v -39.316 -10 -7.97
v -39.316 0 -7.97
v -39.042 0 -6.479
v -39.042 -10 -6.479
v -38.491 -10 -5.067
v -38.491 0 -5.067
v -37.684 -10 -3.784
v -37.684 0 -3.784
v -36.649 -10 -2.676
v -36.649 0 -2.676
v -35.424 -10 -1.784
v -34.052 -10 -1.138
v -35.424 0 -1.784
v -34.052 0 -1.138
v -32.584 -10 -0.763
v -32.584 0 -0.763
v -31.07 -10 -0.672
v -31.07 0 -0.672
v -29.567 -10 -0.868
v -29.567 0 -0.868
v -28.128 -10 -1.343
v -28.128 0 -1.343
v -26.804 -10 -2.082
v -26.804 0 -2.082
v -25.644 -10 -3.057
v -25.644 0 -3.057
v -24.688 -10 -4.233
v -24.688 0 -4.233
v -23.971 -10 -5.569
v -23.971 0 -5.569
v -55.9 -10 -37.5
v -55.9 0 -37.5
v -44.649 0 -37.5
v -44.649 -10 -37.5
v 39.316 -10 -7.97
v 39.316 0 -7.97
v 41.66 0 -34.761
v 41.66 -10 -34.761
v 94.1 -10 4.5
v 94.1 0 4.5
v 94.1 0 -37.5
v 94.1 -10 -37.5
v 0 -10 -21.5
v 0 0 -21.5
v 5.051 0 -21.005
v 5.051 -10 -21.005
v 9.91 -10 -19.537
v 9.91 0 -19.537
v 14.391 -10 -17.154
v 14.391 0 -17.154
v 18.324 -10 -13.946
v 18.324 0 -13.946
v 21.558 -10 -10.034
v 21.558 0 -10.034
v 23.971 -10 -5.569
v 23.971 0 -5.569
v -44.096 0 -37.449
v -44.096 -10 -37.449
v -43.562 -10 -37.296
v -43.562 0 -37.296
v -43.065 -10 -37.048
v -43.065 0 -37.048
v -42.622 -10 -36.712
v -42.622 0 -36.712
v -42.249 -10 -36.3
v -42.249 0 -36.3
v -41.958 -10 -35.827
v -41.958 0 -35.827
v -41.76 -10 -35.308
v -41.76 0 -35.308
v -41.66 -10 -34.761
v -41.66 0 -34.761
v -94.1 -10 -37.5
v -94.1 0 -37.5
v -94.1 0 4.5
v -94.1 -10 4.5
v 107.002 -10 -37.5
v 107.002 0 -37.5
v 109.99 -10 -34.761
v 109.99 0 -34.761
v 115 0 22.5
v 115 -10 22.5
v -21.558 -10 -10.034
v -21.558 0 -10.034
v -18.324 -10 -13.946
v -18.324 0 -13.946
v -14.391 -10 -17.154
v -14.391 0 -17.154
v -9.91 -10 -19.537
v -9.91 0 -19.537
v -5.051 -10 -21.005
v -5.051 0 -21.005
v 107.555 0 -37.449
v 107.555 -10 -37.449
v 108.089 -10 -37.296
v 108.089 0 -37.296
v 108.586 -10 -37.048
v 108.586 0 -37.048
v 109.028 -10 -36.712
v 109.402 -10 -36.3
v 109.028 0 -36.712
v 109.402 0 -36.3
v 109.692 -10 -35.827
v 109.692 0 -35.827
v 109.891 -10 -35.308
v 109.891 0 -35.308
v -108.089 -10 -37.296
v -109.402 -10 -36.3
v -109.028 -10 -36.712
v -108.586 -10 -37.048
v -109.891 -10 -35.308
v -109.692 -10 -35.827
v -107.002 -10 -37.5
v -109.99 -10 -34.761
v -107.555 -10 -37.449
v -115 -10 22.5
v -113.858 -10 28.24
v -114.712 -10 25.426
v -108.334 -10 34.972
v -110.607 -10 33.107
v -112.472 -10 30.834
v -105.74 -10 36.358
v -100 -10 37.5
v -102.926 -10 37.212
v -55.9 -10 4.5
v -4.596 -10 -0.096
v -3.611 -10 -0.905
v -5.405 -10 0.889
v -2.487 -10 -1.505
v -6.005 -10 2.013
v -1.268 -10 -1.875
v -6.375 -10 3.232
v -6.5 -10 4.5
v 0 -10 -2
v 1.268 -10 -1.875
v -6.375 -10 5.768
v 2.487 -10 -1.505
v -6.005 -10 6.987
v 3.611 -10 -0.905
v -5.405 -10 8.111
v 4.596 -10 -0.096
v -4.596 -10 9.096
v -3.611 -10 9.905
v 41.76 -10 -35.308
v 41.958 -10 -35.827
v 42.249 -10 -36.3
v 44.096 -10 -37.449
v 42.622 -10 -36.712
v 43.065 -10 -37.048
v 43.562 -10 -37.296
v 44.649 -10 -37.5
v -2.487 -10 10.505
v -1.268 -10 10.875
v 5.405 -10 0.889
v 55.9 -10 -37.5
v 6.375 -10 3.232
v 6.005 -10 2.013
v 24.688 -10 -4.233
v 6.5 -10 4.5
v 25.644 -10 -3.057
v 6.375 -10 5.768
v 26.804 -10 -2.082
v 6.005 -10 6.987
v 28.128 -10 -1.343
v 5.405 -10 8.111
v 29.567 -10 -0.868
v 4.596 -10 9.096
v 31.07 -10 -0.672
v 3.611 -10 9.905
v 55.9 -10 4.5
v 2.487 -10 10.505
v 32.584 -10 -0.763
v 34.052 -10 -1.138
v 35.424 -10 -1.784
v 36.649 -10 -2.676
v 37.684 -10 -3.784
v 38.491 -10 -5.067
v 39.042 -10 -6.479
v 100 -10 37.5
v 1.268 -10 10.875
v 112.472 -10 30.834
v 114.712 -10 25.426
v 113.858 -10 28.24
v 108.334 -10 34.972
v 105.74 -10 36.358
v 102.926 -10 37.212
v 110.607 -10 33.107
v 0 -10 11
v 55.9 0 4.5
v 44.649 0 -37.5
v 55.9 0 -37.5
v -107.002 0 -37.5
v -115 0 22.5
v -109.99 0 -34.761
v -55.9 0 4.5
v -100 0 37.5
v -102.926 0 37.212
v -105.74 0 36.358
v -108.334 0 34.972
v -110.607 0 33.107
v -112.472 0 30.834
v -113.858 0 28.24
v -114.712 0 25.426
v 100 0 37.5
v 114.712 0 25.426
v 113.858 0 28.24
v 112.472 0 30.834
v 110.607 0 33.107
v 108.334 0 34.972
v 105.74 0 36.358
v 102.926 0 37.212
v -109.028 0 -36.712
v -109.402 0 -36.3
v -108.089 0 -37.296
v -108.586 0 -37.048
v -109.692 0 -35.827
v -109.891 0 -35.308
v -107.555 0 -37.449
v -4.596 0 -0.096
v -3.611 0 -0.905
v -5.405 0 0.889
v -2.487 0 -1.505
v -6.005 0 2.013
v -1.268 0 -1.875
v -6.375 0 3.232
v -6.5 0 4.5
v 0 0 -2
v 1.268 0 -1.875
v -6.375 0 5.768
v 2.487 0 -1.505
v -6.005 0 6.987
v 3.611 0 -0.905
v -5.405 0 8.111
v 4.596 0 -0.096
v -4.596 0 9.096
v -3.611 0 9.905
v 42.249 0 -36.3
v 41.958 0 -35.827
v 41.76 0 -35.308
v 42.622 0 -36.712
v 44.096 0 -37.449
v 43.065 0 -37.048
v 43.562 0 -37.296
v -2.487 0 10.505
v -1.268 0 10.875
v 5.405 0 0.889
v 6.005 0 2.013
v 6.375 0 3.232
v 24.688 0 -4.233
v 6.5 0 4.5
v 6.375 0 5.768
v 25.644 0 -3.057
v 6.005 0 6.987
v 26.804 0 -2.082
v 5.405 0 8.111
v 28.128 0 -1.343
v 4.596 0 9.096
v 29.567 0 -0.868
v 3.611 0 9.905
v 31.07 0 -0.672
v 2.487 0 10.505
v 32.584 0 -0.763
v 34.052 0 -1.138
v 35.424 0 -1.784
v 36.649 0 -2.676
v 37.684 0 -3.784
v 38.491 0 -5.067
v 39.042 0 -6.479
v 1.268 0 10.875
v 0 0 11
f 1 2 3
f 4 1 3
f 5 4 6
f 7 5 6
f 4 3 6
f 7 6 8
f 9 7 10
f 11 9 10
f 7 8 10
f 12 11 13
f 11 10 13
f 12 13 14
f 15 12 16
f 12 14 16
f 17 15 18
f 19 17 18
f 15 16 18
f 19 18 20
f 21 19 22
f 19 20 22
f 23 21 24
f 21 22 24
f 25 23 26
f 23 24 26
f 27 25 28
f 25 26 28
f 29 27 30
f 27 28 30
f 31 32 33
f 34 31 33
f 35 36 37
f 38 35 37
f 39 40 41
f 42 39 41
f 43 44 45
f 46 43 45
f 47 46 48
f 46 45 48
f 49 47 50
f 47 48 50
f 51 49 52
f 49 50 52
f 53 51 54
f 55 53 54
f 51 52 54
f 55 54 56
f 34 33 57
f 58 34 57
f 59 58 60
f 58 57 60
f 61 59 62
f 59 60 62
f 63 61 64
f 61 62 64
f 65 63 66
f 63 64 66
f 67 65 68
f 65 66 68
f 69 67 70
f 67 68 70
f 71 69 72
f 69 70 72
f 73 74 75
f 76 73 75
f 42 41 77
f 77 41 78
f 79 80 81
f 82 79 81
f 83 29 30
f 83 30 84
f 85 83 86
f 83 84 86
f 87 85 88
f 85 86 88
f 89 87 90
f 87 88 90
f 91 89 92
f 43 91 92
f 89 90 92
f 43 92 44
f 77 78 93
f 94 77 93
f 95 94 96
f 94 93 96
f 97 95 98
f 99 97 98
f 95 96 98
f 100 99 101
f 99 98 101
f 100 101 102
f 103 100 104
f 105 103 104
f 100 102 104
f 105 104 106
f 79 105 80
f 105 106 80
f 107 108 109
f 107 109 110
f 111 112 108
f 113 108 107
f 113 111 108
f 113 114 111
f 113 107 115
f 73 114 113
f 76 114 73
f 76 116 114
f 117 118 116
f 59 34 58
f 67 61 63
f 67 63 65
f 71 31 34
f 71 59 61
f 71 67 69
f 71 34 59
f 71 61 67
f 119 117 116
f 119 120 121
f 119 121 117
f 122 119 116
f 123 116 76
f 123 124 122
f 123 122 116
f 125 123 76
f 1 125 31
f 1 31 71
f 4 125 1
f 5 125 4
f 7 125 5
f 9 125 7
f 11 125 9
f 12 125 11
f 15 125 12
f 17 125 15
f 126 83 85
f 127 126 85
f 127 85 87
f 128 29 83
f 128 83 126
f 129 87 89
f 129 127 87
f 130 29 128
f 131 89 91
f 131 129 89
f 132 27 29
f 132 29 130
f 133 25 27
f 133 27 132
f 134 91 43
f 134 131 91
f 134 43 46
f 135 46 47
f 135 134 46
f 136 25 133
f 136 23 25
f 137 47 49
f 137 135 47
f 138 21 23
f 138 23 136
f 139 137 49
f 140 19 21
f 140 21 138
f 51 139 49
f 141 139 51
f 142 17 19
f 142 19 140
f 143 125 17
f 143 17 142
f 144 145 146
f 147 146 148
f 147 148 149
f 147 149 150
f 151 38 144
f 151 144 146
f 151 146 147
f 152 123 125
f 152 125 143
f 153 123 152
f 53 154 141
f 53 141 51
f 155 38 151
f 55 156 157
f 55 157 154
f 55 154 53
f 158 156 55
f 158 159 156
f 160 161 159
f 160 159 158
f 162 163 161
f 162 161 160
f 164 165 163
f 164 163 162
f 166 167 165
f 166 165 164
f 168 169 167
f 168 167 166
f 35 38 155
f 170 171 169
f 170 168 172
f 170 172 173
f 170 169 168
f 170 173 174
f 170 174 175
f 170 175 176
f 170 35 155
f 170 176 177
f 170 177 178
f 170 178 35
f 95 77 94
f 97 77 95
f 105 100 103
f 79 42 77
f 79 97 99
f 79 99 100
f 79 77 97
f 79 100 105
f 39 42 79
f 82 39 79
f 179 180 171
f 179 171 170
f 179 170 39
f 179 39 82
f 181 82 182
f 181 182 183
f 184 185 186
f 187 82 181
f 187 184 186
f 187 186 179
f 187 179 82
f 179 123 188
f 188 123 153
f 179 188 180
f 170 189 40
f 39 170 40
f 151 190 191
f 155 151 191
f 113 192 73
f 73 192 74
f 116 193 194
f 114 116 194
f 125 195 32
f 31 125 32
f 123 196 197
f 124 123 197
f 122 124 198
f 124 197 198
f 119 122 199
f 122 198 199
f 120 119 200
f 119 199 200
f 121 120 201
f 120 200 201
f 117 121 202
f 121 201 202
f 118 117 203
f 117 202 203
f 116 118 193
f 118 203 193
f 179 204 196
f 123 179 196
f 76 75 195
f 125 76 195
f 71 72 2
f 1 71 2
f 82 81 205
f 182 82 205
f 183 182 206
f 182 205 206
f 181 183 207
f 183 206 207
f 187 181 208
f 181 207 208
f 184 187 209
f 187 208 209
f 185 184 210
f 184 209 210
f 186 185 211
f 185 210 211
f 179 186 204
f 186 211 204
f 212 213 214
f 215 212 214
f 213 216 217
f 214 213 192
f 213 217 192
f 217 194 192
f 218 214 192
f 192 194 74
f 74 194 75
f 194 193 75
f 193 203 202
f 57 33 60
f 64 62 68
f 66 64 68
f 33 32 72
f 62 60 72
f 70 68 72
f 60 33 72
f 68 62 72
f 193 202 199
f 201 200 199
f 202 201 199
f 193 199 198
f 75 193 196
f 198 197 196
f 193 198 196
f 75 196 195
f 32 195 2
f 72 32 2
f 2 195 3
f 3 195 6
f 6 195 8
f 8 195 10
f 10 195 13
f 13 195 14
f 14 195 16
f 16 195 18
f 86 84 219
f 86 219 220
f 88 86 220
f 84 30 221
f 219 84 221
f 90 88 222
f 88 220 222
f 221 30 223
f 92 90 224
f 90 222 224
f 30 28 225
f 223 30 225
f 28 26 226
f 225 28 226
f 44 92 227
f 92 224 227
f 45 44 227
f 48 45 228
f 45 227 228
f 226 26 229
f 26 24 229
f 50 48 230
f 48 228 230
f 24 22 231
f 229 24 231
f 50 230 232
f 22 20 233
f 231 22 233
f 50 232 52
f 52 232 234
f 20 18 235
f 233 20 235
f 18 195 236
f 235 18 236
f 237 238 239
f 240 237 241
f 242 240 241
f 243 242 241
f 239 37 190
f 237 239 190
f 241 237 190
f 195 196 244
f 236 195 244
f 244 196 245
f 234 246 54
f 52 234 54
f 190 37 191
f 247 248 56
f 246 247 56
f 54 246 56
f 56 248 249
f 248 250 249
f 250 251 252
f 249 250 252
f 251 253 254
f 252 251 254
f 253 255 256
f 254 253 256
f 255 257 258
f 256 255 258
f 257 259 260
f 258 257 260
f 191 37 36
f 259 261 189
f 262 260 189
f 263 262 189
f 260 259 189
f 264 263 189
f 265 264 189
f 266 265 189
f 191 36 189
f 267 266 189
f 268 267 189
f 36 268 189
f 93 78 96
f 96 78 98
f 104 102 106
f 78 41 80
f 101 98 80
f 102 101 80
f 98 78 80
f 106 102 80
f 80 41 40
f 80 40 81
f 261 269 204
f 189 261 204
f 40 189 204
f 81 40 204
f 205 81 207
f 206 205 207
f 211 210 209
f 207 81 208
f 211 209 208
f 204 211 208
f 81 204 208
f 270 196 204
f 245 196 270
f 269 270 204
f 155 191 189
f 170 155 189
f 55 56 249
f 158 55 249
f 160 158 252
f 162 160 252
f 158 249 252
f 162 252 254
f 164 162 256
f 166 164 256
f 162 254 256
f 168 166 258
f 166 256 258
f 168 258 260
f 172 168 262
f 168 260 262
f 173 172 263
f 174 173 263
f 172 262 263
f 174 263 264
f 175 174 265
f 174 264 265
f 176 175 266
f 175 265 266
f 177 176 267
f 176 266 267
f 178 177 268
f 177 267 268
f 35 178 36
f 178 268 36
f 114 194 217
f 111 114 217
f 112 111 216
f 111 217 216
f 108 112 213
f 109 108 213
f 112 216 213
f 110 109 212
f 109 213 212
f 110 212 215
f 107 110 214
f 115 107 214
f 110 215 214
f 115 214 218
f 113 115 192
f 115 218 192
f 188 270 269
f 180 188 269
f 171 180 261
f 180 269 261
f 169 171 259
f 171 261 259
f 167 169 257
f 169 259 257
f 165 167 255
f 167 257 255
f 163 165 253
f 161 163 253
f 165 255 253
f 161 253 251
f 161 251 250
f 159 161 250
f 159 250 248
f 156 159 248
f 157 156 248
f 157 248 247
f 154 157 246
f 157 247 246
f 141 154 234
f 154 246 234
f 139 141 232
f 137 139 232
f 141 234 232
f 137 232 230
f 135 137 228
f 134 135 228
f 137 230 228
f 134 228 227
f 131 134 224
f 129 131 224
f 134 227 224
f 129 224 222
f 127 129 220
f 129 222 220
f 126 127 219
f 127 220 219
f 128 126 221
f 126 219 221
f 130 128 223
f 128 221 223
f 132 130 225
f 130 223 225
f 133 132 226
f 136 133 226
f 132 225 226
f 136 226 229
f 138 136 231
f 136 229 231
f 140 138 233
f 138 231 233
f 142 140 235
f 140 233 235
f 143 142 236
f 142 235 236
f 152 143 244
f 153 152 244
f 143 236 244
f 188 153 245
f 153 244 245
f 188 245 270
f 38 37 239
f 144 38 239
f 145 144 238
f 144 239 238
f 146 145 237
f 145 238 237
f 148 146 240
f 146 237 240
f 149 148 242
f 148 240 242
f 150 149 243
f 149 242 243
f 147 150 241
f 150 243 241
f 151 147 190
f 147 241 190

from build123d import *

# Parameters (mm, degrees)
F1_DEPTH = 10


with BuildPart() as f1:
    # F0 (on Front) → F1 (new body)
    with BuildSketch(Plane.XZ):
        with BuildLine():
            Line((-55.9, -37.5), (-44.648994, -37.5))
            ThreePointArc((-44.648994, -37.5), (-42.622223, -36.711832), (-41.660409, -34.761467))
            Line((-41.660409, -34.761467), (-39.316447, -7.969854))
            ThreePointArc((-39.316447, -7.969854), (-32.58351, -0.763255), (-23.971151, -5.568959))
            ThreePointArc((-23.971151, -5.568959), (-14.391092, -17.154017), (0, -21.5))
            ThreePointArc((0, -21.5), (14.391092, -17.154017), (23.971151, -5.568959))
            ThreePointArc((23.971151, -5.568959), (32.58351, -0.763255), (39.316447, -7.969854))
            Line((39.316447, -7.969854), (41.660409, -34.761467))
            ThreePointArc((41.660409, -34.761467), (42.622223, -36.711832), (44.648994, -37.5))
            Line((44.648994, -37.5), (55.9, -37.5))
            Line((55.9, -37.5), (55.9, 4.5))
            Line((55.9, 4.5), (94.1, 4.5))
            Line((94.1, 4.5), (94.1, -37.5))
            Line((94.1, -37.5), (107.001687, -37.5))
            ThreePointArc((107.001687, -37.5), (109.028457, -36.711832), (109.990271, -34.761467))
            Line((109.990271, -34.761467), (115, 22.5))
            ThreePointArc((115, 22.5), (110.606602, 33.106602), (100, 37.5))
            Line((100, 37.5), (0, 37.5))
            Line((0, 37.5), (-100, 37.5))
            ThreePointArc((-100, 37.5), (-110.606602, 33.106602), (-115, 22.5))
            Line((-115, 22.5), (-109.990271, -34.761467))
            ThreePointArc((-109.990271, -34.761467), (-109.028457, -36.711832), (-107.001687, -37.5))
            Line((-107.001687, -37.5), (-94.1, -37.5))
            Line((-94.1, -37.5), (-94.1, 4.5))
            Line((-94.1, 4.5), (-55.9, 4.5))
            Line((-55.9, 4.5), (-55.9, -37.5))
        make_face()
        with BuildLine():
            ThreePointArc((0, -2), (-6.5, 4.5), (0, 11))
            ThreePointArc((0, 11), (6.5, 4.5), (0, -2))
        make_face(mode=Mode.SUBTRACT)
    extrude(amount=F1_DEPTH)


solid = f1.part
